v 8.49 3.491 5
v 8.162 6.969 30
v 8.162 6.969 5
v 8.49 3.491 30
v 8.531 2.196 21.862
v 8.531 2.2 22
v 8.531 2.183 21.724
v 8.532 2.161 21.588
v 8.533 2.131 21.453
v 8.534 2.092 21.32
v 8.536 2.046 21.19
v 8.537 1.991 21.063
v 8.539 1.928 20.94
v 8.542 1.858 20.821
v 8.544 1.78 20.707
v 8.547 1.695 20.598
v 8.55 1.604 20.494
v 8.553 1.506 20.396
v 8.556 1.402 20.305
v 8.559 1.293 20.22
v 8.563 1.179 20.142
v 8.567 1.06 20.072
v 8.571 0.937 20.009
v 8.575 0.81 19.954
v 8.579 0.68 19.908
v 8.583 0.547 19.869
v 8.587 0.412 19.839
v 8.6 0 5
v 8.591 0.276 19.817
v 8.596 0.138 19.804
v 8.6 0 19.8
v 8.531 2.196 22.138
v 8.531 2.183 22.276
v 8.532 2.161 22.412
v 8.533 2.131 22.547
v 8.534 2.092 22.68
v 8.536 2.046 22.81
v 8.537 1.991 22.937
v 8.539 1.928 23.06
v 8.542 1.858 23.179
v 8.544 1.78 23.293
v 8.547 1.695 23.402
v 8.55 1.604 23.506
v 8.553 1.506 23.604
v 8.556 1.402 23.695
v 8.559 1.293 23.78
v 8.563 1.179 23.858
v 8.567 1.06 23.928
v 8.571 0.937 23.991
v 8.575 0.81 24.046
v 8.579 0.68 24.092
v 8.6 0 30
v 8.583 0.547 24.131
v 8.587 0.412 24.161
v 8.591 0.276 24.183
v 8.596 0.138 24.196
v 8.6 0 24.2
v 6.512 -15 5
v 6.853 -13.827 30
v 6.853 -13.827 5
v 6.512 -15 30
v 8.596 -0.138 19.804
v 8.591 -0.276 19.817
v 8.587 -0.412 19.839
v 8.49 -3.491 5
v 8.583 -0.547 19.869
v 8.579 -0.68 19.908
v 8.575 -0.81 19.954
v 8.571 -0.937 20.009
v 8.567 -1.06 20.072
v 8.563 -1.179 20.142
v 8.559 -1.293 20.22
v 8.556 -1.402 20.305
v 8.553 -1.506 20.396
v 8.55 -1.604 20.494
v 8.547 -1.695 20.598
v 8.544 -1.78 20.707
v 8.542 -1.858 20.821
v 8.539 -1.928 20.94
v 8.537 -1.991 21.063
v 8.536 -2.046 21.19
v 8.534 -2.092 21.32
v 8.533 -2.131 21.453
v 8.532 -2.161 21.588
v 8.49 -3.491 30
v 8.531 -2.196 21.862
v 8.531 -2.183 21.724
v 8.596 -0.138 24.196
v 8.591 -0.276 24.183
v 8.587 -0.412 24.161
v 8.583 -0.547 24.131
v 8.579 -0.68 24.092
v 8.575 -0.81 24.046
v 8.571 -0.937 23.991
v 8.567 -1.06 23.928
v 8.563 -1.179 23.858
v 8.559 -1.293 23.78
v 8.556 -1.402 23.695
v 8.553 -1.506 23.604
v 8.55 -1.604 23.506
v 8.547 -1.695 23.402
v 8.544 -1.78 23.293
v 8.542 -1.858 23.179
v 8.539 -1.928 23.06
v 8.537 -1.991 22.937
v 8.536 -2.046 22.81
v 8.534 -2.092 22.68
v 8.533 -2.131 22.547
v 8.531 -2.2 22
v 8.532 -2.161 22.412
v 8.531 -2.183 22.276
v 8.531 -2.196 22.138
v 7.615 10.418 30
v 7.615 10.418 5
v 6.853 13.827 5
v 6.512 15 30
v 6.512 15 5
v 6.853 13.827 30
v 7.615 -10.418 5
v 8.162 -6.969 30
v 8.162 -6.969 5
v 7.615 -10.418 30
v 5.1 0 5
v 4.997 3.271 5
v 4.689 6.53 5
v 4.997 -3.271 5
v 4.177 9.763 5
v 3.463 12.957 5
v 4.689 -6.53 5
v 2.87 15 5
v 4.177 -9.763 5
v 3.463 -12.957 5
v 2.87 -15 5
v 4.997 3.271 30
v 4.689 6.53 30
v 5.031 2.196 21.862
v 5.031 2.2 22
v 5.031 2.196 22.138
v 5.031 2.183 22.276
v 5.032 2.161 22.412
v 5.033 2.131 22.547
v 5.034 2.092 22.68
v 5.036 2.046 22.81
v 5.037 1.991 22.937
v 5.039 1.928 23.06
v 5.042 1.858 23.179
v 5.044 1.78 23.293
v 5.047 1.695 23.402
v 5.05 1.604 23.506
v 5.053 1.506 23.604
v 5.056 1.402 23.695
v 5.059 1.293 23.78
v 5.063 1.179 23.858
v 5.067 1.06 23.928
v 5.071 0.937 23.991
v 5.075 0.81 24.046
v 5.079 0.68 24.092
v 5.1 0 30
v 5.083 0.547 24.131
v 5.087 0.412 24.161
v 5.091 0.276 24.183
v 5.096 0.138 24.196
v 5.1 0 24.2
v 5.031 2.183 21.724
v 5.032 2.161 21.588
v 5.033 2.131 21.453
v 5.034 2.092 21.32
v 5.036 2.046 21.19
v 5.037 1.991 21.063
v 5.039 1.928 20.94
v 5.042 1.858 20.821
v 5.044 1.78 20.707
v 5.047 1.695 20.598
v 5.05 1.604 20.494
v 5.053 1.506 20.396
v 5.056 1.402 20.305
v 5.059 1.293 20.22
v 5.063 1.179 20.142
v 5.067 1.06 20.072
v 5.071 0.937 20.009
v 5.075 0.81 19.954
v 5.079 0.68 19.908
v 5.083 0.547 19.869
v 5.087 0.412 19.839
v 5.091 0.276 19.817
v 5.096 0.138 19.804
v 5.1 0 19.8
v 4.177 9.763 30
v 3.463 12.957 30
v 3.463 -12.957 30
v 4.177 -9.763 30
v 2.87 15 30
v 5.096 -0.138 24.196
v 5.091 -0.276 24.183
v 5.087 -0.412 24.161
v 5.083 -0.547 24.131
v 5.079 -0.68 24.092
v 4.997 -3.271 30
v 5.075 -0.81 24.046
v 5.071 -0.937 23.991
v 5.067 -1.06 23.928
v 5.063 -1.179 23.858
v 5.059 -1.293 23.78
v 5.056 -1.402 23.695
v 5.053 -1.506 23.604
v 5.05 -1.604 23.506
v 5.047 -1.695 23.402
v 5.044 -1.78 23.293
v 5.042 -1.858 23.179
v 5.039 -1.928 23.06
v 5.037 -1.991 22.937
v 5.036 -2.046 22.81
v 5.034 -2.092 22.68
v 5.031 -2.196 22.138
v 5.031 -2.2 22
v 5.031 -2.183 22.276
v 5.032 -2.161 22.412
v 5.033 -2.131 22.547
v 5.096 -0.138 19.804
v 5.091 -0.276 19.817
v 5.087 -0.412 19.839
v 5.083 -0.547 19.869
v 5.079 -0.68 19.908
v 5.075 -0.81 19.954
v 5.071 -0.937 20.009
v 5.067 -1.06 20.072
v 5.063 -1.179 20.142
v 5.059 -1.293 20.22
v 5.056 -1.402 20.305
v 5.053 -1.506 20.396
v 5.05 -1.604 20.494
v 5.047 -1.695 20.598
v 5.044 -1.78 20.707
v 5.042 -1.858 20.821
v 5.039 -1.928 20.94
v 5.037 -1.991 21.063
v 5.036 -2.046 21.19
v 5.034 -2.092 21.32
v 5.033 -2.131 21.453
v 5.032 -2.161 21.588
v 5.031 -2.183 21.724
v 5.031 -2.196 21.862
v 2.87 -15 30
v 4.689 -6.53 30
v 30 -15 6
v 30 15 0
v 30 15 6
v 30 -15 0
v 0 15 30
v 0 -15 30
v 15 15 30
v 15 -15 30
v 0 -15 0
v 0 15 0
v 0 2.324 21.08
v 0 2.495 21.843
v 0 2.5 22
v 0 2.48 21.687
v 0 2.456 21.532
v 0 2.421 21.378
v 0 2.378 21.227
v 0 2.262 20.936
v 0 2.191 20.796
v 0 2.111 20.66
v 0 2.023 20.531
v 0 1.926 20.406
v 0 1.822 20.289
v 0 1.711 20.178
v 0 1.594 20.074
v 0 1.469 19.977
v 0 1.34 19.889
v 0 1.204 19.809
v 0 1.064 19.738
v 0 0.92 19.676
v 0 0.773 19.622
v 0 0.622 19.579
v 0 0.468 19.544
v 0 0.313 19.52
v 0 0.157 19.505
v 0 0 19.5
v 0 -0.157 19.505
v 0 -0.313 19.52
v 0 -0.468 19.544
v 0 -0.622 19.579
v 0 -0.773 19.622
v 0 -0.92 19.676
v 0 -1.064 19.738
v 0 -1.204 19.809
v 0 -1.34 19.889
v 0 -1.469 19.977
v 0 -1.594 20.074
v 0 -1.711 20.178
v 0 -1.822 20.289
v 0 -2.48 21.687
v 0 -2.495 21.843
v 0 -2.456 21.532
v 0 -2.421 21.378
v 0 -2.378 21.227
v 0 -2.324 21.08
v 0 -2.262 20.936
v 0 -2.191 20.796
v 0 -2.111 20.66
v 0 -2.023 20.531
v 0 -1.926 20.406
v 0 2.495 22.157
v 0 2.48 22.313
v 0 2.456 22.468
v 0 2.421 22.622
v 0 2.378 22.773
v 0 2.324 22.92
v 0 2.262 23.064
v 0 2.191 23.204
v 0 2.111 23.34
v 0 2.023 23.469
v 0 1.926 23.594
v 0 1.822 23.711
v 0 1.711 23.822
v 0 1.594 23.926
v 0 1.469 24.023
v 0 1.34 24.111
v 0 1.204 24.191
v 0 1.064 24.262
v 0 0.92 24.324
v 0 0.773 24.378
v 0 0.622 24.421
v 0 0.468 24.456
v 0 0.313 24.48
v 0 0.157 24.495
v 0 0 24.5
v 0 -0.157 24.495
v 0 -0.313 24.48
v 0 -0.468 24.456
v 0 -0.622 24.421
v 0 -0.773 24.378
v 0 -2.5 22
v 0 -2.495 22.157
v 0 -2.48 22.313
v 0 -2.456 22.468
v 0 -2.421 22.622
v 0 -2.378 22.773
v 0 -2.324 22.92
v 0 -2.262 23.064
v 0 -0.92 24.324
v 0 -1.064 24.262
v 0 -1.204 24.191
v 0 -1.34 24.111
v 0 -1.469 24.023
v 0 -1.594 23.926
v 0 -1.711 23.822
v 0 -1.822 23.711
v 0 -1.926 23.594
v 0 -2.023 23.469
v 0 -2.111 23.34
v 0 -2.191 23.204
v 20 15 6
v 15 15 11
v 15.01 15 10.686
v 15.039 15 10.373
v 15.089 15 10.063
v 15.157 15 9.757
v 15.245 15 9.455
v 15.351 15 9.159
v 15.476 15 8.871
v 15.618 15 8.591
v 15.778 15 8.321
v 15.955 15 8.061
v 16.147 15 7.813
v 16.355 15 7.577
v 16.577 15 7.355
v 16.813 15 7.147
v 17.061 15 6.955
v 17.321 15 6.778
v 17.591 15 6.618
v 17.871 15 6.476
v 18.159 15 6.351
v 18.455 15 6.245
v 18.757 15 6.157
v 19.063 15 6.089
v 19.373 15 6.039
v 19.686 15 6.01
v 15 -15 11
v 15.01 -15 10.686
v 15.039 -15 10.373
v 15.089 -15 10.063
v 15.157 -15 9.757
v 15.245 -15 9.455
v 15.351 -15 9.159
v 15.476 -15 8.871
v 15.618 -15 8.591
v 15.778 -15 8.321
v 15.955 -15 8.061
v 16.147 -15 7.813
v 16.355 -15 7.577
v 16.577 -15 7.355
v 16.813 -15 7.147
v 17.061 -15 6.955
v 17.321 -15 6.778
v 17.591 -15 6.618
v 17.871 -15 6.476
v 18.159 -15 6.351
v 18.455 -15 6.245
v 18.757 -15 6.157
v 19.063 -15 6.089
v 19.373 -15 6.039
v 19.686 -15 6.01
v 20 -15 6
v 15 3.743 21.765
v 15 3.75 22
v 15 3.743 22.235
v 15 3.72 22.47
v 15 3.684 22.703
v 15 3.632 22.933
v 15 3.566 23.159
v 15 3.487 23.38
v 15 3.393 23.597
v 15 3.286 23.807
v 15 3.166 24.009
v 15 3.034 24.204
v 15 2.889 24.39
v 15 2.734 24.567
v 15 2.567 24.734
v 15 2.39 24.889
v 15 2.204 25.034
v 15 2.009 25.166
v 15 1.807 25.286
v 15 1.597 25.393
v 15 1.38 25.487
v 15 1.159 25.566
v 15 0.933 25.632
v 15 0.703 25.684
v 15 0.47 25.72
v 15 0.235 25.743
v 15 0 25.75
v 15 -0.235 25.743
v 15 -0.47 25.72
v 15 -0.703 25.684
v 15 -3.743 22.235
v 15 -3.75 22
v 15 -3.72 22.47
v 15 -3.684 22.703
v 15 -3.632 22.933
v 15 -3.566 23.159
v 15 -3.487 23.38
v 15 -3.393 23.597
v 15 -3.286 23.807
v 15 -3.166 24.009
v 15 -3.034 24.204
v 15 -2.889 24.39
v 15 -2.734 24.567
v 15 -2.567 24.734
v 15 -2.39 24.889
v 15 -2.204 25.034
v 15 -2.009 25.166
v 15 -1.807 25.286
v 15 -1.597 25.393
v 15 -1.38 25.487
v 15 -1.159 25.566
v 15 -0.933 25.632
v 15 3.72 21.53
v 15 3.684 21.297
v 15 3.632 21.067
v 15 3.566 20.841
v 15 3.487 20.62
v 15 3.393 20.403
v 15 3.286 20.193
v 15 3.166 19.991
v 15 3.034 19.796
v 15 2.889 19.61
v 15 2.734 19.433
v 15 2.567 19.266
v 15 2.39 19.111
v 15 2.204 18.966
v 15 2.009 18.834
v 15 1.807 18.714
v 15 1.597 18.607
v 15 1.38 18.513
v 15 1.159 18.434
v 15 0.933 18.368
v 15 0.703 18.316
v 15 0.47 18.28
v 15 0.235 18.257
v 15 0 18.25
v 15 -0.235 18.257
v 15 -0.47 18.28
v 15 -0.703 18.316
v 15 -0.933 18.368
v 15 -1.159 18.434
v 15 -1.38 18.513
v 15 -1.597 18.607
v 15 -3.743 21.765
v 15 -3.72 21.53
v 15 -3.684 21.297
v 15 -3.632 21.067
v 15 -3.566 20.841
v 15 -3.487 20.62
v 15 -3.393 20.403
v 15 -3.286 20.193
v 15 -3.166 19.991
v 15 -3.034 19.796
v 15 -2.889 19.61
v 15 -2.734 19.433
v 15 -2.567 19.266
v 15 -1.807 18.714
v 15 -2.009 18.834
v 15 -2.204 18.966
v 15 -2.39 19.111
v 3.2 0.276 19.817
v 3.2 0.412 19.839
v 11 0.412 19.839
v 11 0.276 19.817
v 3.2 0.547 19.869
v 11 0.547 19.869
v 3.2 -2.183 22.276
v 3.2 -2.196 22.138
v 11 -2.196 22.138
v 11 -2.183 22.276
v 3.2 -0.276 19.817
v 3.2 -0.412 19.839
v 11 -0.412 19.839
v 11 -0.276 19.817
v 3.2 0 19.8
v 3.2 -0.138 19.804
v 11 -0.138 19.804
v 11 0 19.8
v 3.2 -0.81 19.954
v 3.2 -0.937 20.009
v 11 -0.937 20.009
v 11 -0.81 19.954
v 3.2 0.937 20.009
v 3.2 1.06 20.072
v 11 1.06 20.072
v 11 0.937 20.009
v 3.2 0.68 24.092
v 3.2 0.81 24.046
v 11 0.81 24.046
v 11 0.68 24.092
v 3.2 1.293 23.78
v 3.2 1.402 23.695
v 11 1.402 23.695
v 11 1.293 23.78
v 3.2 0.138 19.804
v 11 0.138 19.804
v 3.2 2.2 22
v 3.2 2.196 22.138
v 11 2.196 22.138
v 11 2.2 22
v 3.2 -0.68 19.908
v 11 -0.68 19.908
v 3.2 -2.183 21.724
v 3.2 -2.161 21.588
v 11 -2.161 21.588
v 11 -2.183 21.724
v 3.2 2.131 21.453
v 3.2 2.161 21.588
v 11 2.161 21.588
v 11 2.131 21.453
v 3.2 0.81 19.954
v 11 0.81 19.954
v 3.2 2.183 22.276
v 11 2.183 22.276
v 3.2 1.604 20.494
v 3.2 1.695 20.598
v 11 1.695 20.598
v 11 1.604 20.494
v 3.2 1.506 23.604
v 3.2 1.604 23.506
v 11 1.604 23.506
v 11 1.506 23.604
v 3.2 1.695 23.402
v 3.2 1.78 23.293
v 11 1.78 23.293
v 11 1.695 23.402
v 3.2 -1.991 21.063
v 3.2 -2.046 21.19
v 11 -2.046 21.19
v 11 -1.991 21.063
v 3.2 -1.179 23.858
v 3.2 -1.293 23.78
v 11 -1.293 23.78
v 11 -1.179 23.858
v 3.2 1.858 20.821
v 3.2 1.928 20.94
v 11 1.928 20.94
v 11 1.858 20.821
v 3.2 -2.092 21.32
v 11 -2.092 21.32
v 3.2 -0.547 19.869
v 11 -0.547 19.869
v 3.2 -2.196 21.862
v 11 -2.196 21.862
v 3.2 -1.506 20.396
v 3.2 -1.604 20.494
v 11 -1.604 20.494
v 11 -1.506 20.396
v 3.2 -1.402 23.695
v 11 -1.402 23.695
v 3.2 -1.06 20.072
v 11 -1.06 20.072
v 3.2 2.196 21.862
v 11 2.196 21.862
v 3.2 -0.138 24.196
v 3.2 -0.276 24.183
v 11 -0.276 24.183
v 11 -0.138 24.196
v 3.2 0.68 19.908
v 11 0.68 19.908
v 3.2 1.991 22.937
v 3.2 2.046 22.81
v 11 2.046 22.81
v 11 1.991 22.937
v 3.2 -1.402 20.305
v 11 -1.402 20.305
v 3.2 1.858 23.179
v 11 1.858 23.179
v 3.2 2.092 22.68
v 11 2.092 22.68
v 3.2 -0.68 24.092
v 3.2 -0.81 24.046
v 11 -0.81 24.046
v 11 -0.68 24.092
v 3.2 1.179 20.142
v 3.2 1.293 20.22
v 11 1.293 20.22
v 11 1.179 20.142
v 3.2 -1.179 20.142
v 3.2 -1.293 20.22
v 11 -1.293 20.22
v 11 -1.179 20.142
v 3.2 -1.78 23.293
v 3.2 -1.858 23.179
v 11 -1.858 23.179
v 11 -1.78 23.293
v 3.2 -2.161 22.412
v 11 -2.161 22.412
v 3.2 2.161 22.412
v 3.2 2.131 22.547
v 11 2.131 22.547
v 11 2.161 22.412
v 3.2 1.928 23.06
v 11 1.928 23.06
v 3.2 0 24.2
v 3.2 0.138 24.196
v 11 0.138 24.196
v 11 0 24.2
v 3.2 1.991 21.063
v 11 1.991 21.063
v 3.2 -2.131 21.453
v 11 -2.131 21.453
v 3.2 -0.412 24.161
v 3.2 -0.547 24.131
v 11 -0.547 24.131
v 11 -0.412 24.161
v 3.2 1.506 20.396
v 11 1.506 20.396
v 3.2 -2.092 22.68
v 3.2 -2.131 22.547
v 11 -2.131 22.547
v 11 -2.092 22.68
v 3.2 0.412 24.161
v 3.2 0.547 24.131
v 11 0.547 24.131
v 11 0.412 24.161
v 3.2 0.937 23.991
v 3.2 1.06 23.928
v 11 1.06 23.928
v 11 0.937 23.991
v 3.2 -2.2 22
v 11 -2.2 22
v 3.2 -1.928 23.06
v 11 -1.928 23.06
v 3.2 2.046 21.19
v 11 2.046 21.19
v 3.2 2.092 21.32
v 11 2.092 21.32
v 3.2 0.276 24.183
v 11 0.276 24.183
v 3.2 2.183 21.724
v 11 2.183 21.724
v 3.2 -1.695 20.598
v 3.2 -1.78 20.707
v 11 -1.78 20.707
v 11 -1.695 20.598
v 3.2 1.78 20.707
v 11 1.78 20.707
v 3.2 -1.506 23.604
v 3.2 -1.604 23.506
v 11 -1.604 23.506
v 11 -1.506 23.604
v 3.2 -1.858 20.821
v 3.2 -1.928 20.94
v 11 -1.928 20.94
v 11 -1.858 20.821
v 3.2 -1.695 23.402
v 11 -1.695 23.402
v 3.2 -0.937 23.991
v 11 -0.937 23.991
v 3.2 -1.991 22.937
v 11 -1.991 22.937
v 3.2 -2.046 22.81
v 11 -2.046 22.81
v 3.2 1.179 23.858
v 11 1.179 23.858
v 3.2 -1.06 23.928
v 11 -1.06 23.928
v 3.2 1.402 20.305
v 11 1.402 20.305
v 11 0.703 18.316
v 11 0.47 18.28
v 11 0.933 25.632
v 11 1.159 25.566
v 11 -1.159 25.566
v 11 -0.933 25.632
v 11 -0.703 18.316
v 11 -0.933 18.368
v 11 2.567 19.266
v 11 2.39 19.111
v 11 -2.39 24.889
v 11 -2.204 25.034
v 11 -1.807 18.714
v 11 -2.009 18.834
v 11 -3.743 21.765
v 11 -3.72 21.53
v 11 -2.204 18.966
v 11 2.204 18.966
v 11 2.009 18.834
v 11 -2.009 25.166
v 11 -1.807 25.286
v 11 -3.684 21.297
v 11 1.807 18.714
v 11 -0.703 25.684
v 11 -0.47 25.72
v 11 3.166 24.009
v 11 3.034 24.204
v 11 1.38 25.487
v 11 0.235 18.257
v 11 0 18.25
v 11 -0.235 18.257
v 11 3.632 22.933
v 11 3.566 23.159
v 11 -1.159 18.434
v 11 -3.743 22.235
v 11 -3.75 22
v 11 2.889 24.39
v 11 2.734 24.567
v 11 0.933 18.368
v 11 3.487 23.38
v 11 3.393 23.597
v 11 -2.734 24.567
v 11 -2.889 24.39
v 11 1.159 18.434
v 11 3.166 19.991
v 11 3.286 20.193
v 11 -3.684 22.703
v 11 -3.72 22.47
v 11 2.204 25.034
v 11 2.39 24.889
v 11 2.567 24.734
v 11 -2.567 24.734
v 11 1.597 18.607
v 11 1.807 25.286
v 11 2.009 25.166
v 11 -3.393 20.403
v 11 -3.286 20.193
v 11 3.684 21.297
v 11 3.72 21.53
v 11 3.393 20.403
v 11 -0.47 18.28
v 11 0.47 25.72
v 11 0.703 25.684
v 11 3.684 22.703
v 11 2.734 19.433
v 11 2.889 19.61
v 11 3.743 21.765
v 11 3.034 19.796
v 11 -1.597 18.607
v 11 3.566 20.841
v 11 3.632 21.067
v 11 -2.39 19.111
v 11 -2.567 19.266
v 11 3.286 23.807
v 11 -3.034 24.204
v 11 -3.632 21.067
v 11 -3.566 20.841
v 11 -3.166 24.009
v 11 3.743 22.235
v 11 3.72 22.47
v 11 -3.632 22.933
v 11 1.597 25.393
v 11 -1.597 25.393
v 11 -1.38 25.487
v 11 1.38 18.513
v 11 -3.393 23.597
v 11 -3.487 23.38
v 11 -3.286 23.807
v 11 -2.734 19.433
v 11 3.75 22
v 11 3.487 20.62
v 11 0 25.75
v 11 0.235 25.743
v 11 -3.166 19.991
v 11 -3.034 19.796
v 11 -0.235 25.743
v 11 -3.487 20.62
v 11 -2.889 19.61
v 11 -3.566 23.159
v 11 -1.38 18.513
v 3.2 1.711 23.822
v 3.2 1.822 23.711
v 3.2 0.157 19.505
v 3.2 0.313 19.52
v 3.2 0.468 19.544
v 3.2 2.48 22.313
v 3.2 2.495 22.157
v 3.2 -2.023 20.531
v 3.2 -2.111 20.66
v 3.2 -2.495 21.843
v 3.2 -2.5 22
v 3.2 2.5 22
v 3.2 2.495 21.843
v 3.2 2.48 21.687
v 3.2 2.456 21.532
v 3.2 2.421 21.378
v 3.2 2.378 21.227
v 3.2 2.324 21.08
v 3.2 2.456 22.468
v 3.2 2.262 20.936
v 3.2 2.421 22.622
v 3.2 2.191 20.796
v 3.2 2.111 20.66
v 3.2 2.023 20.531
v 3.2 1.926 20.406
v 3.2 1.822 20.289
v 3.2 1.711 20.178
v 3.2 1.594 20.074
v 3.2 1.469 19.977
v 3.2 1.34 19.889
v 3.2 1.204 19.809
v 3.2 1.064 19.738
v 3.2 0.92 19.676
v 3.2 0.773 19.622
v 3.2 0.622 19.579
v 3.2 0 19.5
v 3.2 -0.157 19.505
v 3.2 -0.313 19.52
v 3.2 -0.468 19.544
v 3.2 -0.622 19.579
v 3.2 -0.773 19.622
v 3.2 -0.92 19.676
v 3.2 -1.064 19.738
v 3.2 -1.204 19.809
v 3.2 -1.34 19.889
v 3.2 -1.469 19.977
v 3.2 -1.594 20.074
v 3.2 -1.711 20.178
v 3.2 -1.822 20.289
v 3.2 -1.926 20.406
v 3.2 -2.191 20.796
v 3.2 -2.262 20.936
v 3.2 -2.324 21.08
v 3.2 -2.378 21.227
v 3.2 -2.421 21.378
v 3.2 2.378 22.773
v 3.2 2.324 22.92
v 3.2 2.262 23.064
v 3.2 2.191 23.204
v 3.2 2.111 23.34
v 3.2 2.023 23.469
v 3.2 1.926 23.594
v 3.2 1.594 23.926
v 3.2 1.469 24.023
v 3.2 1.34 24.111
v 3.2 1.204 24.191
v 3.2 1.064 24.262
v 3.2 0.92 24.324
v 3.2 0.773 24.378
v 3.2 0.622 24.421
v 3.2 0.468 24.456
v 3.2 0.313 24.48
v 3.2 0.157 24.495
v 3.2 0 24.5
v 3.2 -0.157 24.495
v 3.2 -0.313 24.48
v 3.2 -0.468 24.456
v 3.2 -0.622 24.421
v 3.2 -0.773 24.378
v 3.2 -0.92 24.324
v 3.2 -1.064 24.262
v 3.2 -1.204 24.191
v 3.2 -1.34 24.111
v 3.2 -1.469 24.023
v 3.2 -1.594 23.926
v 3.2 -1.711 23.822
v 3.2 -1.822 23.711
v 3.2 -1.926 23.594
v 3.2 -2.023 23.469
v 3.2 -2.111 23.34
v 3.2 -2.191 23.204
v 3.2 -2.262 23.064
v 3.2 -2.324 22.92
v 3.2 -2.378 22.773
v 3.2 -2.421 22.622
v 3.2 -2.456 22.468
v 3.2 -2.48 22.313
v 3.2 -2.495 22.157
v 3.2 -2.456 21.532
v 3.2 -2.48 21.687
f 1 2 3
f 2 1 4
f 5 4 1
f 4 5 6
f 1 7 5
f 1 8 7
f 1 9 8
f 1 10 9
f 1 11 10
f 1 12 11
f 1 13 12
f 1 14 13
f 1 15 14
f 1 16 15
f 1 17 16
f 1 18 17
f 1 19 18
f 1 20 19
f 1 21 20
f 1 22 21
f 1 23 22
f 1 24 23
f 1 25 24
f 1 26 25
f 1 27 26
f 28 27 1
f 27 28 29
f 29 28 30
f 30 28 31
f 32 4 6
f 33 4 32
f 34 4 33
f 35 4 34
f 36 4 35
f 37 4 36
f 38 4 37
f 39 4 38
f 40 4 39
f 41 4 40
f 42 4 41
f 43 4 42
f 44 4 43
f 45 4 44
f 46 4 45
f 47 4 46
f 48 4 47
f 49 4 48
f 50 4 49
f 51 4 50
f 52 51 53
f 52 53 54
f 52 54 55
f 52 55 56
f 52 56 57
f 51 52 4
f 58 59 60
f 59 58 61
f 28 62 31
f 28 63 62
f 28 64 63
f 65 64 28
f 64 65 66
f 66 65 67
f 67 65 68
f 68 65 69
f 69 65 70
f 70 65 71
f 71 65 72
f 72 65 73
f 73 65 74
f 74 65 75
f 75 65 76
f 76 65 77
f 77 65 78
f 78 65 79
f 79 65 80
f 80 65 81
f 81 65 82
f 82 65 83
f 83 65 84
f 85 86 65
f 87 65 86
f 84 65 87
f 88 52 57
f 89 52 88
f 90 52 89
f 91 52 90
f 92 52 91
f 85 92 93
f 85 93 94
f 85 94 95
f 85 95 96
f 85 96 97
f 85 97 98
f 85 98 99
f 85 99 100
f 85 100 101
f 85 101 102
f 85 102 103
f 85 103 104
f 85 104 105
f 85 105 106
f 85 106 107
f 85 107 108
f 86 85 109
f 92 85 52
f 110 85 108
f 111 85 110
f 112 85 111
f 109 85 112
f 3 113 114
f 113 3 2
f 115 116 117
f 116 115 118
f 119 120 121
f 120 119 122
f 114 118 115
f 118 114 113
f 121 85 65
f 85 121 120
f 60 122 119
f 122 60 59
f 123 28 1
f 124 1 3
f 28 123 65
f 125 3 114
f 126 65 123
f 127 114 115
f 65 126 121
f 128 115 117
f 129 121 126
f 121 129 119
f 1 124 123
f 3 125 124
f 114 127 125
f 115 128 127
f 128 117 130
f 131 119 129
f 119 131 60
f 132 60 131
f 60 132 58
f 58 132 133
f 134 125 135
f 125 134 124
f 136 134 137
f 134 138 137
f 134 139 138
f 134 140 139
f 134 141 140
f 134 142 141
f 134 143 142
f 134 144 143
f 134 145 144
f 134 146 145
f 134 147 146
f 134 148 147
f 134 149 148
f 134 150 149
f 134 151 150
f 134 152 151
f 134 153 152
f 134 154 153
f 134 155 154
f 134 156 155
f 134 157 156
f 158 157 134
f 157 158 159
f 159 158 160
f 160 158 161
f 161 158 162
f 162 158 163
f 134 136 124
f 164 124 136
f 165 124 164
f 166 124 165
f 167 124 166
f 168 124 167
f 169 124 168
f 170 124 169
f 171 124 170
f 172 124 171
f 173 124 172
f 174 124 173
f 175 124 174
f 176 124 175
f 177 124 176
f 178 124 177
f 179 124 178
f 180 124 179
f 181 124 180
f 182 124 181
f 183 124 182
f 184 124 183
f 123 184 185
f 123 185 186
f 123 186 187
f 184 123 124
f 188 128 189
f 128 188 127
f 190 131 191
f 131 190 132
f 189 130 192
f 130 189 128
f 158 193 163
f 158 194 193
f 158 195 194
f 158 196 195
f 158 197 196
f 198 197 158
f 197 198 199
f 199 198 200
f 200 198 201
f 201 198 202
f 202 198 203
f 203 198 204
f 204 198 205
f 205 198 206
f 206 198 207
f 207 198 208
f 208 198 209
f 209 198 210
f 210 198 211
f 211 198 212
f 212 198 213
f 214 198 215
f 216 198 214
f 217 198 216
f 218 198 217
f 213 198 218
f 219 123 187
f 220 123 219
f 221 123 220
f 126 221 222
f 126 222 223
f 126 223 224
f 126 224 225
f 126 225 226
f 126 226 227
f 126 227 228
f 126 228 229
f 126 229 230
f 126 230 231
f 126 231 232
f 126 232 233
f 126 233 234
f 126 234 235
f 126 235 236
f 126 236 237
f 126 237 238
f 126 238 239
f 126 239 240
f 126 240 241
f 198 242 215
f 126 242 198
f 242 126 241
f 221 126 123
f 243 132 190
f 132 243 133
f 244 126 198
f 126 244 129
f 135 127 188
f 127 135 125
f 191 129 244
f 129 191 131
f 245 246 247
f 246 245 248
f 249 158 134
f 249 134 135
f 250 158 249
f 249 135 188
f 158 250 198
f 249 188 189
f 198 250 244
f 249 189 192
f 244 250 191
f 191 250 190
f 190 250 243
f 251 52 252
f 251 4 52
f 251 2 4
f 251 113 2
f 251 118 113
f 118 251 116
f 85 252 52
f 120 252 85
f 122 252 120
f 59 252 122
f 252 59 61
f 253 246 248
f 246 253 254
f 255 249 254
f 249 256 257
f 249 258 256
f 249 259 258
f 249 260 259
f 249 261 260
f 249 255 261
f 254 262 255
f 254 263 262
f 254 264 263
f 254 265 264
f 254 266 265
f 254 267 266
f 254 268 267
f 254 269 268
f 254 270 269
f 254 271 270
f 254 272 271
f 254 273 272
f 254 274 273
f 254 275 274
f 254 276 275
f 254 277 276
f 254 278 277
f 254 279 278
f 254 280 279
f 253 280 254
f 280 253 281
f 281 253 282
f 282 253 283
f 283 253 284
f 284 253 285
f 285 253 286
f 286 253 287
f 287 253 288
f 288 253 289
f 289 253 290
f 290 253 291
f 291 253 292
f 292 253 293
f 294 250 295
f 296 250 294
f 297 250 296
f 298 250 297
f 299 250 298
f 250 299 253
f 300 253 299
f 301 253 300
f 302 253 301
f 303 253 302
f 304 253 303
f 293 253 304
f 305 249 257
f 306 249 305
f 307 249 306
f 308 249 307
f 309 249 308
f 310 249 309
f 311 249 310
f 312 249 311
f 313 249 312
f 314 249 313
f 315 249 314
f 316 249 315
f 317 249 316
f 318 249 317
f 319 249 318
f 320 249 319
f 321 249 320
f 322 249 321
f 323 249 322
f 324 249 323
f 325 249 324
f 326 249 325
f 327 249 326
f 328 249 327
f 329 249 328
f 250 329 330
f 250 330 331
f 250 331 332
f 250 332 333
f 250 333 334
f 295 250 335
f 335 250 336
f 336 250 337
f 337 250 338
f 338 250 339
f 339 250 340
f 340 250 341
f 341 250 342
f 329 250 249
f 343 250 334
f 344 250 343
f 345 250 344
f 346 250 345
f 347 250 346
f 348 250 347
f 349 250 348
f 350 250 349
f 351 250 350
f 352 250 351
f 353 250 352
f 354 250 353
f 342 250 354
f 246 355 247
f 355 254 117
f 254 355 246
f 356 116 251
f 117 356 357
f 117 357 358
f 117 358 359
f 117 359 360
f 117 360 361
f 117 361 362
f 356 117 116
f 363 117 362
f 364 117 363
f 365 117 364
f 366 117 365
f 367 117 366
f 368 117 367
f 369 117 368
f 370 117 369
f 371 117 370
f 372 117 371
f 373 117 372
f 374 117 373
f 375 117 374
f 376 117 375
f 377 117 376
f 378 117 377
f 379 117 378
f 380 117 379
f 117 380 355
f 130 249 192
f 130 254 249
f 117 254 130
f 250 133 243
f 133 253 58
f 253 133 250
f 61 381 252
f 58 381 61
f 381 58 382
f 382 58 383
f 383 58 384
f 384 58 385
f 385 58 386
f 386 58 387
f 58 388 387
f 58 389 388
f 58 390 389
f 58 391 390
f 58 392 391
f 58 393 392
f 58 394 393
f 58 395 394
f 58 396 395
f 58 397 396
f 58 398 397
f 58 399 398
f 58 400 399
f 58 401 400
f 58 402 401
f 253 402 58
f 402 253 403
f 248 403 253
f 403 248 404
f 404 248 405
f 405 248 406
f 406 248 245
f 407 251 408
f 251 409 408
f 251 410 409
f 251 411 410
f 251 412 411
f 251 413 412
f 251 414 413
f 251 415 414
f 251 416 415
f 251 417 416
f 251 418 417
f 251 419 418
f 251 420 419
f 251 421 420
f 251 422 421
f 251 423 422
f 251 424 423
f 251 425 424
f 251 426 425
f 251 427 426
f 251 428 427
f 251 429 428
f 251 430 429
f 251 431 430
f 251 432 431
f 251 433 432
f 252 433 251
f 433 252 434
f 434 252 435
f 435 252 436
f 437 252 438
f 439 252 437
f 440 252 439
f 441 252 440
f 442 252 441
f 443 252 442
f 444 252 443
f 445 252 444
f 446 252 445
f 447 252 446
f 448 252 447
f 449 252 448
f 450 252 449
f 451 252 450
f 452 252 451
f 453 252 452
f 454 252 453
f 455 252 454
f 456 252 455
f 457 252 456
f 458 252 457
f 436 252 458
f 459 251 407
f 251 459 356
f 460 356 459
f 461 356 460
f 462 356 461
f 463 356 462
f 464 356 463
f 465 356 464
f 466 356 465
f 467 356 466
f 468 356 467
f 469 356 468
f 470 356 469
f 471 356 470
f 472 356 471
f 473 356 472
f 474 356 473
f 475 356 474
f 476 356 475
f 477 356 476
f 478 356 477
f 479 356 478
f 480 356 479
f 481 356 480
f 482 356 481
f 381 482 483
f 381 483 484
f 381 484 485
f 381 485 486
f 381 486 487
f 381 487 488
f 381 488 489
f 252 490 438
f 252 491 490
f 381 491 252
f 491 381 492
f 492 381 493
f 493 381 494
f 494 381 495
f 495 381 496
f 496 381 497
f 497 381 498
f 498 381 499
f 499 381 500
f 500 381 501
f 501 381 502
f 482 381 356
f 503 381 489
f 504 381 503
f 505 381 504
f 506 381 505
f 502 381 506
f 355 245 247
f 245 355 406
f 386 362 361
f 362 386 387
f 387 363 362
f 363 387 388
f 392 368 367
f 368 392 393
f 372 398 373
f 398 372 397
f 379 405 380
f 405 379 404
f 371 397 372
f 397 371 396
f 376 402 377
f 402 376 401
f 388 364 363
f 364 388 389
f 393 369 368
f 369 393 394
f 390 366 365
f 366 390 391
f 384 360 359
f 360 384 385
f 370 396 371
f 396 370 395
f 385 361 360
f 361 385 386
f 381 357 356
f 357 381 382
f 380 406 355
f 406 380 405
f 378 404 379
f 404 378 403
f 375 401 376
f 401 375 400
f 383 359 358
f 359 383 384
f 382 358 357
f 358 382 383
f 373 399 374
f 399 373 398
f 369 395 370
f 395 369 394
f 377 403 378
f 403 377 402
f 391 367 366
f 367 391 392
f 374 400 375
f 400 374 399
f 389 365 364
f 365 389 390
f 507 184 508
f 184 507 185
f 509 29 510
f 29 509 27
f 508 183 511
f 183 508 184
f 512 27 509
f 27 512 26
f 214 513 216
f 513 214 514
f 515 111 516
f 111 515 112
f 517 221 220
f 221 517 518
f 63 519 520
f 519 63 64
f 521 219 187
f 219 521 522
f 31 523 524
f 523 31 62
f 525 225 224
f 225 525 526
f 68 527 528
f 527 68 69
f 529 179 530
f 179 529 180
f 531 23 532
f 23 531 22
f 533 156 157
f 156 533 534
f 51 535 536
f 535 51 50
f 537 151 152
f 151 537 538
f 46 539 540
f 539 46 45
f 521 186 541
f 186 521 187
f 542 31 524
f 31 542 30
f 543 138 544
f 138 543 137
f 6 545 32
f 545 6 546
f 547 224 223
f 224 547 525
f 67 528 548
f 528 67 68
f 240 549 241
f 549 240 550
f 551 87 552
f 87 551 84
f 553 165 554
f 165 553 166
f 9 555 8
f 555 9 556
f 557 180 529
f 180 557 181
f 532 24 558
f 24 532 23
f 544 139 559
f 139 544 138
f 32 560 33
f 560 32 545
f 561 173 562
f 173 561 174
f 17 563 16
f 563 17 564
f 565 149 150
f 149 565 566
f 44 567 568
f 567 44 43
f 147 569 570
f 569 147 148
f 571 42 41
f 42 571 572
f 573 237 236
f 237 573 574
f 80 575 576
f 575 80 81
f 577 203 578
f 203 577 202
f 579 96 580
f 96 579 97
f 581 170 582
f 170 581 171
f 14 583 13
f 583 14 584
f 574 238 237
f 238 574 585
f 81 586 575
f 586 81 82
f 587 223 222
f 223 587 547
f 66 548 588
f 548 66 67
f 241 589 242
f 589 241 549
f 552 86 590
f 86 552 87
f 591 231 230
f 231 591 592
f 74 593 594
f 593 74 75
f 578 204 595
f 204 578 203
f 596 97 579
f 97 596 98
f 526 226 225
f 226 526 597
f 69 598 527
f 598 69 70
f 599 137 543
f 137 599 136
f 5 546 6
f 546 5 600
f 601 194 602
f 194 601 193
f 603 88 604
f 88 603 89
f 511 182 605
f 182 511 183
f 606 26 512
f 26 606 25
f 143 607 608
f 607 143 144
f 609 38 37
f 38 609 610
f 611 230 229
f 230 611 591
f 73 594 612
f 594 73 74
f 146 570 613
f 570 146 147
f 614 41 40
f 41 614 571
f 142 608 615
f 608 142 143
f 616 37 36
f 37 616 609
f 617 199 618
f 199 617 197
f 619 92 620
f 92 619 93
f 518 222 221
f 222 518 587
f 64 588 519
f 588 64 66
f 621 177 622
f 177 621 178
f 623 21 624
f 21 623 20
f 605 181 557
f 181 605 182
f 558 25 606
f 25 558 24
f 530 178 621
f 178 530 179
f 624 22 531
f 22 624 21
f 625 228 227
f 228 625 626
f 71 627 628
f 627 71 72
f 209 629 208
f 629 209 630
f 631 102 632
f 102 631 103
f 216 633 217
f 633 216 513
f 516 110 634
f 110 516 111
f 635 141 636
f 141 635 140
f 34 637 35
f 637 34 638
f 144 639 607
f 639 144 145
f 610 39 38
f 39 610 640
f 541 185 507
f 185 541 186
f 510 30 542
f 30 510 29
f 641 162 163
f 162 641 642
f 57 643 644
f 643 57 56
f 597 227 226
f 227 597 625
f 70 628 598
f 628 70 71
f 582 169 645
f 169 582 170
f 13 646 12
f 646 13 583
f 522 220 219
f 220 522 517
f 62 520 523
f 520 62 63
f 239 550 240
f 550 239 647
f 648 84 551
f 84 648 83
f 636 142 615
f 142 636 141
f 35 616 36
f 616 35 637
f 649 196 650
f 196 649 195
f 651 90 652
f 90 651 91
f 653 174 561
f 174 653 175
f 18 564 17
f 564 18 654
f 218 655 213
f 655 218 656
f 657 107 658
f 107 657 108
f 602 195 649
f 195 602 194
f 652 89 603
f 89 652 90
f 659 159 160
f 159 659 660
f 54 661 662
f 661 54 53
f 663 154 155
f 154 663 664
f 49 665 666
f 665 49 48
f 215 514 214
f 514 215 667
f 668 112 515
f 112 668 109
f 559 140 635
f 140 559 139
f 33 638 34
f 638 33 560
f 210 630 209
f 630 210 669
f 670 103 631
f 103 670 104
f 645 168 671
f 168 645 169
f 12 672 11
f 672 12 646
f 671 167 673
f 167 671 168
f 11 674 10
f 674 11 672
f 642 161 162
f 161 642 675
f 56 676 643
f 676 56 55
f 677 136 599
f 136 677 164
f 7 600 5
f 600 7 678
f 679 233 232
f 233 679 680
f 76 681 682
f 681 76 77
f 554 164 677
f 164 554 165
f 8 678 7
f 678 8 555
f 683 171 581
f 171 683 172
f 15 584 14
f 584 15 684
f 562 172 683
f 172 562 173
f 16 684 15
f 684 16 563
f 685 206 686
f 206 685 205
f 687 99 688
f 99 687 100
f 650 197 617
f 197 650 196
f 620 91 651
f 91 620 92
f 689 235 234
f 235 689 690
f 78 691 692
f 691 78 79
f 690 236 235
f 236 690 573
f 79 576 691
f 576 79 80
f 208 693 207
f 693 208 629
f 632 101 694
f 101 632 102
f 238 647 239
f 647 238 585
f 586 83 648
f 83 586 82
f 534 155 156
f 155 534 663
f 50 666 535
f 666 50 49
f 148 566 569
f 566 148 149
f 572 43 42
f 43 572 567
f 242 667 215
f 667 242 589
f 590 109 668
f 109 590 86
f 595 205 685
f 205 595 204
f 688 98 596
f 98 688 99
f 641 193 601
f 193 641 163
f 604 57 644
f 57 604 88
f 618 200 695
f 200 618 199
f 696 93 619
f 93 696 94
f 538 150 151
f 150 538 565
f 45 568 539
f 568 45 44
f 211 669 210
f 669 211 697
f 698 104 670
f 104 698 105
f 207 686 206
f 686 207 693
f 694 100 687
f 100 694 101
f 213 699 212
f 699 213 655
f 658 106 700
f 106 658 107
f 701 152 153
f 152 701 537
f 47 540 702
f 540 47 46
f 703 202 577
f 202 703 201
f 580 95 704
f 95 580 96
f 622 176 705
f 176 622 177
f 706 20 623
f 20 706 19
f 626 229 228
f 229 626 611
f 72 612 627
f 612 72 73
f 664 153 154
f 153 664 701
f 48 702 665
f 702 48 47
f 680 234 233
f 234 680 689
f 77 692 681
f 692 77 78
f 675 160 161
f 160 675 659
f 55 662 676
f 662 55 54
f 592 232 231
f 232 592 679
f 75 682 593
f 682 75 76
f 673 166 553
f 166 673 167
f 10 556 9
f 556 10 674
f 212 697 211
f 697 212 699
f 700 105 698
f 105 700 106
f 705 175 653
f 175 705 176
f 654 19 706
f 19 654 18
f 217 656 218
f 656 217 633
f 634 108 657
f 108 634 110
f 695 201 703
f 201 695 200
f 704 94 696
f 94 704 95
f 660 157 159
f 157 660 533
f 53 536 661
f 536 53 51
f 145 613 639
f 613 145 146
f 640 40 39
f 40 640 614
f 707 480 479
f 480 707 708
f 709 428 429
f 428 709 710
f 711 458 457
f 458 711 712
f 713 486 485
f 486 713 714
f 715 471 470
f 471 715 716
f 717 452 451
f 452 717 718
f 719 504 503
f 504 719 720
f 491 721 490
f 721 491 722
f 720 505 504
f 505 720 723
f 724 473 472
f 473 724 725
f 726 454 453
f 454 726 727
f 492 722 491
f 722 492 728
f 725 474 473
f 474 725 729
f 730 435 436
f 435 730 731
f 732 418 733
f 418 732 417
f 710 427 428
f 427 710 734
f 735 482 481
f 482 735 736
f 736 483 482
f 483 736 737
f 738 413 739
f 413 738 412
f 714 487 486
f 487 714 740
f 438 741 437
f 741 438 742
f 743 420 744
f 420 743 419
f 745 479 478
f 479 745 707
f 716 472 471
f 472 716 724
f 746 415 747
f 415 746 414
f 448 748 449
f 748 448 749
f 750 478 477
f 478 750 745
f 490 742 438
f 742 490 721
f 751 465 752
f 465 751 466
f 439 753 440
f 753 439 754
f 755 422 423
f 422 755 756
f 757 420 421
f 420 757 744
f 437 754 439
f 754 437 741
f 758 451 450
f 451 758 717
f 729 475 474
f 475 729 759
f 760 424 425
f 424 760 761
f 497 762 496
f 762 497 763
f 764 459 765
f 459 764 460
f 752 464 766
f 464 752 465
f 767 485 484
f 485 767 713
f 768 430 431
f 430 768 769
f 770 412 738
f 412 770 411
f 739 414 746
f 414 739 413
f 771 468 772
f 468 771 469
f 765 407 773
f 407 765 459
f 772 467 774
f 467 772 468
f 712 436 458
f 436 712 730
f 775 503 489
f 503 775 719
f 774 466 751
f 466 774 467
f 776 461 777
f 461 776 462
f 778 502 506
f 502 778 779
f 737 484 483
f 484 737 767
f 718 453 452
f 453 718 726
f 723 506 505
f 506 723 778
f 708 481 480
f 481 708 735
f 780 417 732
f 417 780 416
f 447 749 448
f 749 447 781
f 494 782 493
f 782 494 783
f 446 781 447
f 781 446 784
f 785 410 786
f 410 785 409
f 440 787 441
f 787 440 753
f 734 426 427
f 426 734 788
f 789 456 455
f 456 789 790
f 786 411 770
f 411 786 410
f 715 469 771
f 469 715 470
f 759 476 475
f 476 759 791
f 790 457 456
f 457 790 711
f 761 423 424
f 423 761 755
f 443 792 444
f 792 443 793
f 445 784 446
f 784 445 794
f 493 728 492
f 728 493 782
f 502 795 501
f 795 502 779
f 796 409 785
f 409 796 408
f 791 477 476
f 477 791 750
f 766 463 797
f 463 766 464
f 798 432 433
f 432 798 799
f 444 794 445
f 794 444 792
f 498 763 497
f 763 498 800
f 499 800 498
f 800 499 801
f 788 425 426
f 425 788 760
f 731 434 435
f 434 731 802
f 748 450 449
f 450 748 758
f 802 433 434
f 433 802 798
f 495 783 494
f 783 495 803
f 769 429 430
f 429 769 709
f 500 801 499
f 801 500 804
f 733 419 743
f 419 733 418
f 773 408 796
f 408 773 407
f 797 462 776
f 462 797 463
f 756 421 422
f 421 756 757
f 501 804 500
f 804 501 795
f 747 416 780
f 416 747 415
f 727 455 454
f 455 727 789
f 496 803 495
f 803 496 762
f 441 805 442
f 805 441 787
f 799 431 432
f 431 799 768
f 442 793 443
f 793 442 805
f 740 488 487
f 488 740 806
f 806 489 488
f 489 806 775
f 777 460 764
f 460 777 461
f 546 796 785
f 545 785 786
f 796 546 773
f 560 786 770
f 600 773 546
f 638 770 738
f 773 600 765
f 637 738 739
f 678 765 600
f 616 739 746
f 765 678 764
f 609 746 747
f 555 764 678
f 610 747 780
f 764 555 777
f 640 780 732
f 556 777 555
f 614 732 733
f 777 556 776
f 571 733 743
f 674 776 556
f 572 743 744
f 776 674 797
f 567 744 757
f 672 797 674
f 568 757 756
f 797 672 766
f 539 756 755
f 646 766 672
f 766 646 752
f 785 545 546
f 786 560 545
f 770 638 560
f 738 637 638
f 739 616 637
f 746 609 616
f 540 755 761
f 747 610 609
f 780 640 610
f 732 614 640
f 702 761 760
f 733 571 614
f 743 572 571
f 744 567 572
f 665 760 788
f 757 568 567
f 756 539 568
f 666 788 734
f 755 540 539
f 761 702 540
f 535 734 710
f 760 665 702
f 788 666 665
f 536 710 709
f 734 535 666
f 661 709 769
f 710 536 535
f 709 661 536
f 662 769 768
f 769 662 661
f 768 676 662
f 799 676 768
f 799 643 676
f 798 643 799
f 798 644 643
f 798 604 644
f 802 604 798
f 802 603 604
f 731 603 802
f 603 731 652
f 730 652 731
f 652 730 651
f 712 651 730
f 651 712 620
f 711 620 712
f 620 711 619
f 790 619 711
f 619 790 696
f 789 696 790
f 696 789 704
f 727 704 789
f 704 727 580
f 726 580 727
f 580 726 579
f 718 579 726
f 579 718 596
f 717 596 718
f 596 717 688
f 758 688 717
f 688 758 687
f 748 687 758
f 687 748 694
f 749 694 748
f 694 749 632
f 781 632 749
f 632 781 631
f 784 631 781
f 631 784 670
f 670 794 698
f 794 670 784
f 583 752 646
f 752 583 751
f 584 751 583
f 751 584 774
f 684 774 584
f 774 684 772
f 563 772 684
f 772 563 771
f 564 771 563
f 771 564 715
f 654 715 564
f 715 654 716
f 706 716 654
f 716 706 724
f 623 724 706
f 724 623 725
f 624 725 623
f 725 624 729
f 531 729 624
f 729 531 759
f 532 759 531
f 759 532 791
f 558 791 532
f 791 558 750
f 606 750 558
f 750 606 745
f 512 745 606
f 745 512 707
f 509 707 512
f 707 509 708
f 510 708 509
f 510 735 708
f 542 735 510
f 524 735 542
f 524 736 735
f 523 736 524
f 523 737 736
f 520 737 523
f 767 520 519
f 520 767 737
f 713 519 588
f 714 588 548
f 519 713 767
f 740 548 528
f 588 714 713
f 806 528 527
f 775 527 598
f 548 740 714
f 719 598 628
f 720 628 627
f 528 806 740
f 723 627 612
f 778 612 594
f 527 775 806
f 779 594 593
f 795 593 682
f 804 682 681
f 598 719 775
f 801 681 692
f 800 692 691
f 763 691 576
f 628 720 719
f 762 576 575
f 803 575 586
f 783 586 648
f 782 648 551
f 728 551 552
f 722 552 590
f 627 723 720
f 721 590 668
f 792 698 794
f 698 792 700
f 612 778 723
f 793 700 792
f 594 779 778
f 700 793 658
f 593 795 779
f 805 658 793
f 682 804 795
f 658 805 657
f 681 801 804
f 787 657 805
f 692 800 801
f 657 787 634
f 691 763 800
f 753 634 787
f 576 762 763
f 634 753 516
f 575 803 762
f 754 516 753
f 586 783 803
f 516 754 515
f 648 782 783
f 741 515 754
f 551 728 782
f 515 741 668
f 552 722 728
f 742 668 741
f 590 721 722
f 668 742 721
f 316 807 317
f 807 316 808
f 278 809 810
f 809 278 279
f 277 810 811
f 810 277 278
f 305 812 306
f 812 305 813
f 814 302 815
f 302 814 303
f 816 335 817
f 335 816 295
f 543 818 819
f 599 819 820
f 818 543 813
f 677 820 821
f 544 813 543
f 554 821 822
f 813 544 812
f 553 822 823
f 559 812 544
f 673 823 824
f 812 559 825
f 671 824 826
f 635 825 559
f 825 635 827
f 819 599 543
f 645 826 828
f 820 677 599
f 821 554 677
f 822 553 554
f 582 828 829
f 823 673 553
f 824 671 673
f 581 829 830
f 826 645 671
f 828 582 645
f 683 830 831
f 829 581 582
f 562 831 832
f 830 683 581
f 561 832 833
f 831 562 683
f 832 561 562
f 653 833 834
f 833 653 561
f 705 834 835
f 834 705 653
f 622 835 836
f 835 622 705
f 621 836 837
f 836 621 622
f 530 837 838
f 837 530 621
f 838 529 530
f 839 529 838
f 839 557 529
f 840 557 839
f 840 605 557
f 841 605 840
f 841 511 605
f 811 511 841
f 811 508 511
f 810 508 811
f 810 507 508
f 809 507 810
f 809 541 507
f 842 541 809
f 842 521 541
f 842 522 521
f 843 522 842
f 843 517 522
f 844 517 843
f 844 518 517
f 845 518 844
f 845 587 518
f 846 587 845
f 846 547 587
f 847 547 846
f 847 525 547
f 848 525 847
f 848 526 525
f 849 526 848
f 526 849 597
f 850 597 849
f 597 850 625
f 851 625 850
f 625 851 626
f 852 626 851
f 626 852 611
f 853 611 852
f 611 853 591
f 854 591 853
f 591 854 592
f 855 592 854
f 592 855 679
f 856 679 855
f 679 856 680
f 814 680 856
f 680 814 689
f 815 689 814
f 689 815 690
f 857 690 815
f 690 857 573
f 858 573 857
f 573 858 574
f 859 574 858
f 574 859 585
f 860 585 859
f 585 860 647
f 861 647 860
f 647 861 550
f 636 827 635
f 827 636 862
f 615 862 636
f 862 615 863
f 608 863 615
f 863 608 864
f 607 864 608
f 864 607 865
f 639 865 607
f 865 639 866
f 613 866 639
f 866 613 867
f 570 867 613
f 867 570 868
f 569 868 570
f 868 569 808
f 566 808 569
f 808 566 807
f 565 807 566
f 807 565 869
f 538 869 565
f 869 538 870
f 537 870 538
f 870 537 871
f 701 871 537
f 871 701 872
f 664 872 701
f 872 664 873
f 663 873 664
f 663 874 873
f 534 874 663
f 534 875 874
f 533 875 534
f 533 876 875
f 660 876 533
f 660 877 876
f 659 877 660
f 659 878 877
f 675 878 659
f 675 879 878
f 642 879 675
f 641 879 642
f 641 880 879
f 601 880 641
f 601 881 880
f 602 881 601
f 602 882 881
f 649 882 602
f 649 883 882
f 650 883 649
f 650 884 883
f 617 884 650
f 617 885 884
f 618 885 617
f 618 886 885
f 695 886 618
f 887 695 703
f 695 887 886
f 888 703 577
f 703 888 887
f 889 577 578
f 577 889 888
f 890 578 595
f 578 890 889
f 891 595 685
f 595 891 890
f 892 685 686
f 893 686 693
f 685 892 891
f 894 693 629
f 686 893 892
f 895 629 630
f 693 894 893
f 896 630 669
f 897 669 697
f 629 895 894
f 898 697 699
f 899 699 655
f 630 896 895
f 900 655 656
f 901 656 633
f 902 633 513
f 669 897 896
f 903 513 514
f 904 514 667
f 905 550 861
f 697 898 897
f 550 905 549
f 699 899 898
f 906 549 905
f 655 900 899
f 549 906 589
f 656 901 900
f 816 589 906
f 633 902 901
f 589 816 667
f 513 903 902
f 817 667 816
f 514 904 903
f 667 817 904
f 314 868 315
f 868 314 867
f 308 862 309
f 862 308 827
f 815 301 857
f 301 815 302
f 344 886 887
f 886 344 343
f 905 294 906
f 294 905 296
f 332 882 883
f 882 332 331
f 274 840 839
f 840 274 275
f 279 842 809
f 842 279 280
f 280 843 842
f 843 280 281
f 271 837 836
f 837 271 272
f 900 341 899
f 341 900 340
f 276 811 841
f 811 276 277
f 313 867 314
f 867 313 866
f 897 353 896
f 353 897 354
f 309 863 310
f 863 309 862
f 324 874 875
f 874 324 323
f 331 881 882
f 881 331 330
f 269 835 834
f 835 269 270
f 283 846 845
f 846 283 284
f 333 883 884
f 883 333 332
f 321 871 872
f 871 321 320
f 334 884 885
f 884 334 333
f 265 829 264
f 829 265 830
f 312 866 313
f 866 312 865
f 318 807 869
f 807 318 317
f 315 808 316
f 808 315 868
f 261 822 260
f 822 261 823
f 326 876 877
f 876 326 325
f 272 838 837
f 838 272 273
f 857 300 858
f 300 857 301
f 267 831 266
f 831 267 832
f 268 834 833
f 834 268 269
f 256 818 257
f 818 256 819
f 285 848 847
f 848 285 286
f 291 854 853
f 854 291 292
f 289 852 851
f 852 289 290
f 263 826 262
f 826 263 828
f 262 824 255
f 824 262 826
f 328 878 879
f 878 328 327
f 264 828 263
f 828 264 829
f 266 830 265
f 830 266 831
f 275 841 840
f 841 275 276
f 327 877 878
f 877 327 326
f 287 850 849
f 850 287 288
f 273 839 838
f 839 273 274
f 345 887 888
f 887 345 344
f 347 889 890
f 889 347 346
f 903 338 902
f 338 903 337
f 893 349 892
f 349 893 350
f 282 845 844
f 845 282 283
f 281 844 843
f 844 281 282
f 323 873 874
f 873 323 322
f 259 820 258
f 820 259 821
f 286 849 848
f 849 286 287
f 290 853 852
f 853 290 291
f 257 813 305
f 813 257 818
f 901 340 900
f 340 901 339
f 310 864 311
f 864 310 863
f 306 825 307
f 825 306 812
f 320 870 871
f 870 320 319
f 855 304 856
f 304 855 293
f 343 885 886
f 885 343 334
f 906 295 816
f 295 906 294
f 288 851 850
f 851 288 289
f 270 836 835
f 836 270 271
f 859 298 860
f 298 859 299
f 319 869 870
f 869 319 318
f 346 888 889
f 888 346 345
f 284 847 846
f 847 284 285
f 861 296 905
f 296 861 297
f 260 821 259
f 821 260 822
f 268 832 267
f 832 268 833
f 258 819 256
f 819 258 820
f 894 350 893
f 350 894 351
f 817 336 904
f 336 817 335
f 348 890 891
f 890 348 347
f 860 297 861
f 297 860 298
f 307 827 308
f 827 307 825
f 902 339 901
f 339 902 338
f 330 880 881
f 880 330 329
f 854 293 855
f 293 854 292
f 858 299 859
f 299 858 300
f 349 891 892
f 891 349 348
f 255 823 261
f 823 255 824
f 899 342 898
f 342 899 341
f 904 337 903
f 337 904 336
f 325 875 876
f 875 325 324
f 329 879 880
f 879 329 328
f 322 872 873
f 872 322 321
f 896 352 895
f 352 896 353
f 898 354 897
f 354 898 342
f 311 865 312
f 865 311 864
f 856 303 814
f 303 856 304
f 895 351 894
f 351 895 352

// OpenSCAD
$fn=100;
module pot() {
    difference() {
        cylinder(d=340,h=320);
        translate([0,0,5]) cylinder(d=330,h=320);
    }
}
module vert_tube() {
    difference() {
        translate([0,0,5]) cylinder(d=110.2+1,h=2000);
        translate([0,0,5]) cylinder(d=110.2-6,h=2010);
    }
}
module top() {
    dExt = 323.5;
    dIn = 111;
    
    difference() {
        circle(d=dExt);
        circle(d=dIn);
        translate([-150,0,0]) circle(r=150,$fn=3);  //triangle
    }
    
}
module tapa_top() {
        dExt = 323.5;
    dIn = 111;
    difference() {
        translate([-150,0,0]) circle(r=150,$fn=3);  //triangle
        difference() {
            circle(d=dExt*2);
            circle(d=dExt);
        }
        circle(d=dIn);
        translate([-162,0,0]) circle(d=20);
        
}
}


module middle() {
    dExt = 340;
    dIn = 110;
    difference() {
        circle(d=dExt);
        circle(d=dIn);
    }
}
module holder() {
    
    //color([0,1,0]) translate([-110/2+1,0,0]) cylinder(d=320,h=2);
    a=30;
    //vert_tube();
    //translate([15-4,0,22]) rotate([0,90,0]) cylinder(d=7.2,h=4);
    difference() {
        translate([0,-a/2,0]) cube([a,a,a]);
        translate([15,-a/2-1,6+5]) cube([a,a+2,a]);
        translate([15+5,-a/2-1,6]) cube([a,a+2,a]);
        translate([15+5,0,6+5]) rotate([90,0,0]) cylinder(r=5,h=50,center=true);
        translate([-110/2+8,0,0]) vert_tube();
        translate([-2,0,22]) rotate([0,90,0]) cylinder(d=4.4,h=300); //screw hole
        translate([15-4,0,22]) rotate([0,90,0]) cylinder(d=7.5,h=4+1); //screw head hole
        translate([-1,0,22]) rotate([0,90,0]) cylinder(d=5,h=3.2+1); //nut hole
        //translate([0,-50,22]) cube([100,100,100]);
        
    }
}

module holder_top() {
    difference() {
    translate([325/2-4.8,-10,0]) cube([5,20,5]);
        difference() {
    
    cylinder(d=400,h=100);
    translate([0,0,-1])cylinder(d=325,h=102);
    }
}
}
//holder_top();
//top();
//tapa_top();
//middle();
holder();
//pot();
//vert_tube();
//rotate([0,0,0*360/6]) translate([0,0,5]) color([1,0,0]) holder();
//rotate([0,0,1*360/6]) translate([0,0,5]) color([1,0,0]) holder();
//rotate([0,0,2*360/6]) translate([0,0,5]) color([1,0,0]) holder();
//rotate([0,0,3*360/6]) translate([0,0,5]) color([1,0,0]) holder();
//rotate([0,0,4*360/6]) translate([0,0,5]) color([1,0,0]) holder();
//rotate([0,0,5*360/6]) translate([0,0,5]) color([1,0,0]) holder();
